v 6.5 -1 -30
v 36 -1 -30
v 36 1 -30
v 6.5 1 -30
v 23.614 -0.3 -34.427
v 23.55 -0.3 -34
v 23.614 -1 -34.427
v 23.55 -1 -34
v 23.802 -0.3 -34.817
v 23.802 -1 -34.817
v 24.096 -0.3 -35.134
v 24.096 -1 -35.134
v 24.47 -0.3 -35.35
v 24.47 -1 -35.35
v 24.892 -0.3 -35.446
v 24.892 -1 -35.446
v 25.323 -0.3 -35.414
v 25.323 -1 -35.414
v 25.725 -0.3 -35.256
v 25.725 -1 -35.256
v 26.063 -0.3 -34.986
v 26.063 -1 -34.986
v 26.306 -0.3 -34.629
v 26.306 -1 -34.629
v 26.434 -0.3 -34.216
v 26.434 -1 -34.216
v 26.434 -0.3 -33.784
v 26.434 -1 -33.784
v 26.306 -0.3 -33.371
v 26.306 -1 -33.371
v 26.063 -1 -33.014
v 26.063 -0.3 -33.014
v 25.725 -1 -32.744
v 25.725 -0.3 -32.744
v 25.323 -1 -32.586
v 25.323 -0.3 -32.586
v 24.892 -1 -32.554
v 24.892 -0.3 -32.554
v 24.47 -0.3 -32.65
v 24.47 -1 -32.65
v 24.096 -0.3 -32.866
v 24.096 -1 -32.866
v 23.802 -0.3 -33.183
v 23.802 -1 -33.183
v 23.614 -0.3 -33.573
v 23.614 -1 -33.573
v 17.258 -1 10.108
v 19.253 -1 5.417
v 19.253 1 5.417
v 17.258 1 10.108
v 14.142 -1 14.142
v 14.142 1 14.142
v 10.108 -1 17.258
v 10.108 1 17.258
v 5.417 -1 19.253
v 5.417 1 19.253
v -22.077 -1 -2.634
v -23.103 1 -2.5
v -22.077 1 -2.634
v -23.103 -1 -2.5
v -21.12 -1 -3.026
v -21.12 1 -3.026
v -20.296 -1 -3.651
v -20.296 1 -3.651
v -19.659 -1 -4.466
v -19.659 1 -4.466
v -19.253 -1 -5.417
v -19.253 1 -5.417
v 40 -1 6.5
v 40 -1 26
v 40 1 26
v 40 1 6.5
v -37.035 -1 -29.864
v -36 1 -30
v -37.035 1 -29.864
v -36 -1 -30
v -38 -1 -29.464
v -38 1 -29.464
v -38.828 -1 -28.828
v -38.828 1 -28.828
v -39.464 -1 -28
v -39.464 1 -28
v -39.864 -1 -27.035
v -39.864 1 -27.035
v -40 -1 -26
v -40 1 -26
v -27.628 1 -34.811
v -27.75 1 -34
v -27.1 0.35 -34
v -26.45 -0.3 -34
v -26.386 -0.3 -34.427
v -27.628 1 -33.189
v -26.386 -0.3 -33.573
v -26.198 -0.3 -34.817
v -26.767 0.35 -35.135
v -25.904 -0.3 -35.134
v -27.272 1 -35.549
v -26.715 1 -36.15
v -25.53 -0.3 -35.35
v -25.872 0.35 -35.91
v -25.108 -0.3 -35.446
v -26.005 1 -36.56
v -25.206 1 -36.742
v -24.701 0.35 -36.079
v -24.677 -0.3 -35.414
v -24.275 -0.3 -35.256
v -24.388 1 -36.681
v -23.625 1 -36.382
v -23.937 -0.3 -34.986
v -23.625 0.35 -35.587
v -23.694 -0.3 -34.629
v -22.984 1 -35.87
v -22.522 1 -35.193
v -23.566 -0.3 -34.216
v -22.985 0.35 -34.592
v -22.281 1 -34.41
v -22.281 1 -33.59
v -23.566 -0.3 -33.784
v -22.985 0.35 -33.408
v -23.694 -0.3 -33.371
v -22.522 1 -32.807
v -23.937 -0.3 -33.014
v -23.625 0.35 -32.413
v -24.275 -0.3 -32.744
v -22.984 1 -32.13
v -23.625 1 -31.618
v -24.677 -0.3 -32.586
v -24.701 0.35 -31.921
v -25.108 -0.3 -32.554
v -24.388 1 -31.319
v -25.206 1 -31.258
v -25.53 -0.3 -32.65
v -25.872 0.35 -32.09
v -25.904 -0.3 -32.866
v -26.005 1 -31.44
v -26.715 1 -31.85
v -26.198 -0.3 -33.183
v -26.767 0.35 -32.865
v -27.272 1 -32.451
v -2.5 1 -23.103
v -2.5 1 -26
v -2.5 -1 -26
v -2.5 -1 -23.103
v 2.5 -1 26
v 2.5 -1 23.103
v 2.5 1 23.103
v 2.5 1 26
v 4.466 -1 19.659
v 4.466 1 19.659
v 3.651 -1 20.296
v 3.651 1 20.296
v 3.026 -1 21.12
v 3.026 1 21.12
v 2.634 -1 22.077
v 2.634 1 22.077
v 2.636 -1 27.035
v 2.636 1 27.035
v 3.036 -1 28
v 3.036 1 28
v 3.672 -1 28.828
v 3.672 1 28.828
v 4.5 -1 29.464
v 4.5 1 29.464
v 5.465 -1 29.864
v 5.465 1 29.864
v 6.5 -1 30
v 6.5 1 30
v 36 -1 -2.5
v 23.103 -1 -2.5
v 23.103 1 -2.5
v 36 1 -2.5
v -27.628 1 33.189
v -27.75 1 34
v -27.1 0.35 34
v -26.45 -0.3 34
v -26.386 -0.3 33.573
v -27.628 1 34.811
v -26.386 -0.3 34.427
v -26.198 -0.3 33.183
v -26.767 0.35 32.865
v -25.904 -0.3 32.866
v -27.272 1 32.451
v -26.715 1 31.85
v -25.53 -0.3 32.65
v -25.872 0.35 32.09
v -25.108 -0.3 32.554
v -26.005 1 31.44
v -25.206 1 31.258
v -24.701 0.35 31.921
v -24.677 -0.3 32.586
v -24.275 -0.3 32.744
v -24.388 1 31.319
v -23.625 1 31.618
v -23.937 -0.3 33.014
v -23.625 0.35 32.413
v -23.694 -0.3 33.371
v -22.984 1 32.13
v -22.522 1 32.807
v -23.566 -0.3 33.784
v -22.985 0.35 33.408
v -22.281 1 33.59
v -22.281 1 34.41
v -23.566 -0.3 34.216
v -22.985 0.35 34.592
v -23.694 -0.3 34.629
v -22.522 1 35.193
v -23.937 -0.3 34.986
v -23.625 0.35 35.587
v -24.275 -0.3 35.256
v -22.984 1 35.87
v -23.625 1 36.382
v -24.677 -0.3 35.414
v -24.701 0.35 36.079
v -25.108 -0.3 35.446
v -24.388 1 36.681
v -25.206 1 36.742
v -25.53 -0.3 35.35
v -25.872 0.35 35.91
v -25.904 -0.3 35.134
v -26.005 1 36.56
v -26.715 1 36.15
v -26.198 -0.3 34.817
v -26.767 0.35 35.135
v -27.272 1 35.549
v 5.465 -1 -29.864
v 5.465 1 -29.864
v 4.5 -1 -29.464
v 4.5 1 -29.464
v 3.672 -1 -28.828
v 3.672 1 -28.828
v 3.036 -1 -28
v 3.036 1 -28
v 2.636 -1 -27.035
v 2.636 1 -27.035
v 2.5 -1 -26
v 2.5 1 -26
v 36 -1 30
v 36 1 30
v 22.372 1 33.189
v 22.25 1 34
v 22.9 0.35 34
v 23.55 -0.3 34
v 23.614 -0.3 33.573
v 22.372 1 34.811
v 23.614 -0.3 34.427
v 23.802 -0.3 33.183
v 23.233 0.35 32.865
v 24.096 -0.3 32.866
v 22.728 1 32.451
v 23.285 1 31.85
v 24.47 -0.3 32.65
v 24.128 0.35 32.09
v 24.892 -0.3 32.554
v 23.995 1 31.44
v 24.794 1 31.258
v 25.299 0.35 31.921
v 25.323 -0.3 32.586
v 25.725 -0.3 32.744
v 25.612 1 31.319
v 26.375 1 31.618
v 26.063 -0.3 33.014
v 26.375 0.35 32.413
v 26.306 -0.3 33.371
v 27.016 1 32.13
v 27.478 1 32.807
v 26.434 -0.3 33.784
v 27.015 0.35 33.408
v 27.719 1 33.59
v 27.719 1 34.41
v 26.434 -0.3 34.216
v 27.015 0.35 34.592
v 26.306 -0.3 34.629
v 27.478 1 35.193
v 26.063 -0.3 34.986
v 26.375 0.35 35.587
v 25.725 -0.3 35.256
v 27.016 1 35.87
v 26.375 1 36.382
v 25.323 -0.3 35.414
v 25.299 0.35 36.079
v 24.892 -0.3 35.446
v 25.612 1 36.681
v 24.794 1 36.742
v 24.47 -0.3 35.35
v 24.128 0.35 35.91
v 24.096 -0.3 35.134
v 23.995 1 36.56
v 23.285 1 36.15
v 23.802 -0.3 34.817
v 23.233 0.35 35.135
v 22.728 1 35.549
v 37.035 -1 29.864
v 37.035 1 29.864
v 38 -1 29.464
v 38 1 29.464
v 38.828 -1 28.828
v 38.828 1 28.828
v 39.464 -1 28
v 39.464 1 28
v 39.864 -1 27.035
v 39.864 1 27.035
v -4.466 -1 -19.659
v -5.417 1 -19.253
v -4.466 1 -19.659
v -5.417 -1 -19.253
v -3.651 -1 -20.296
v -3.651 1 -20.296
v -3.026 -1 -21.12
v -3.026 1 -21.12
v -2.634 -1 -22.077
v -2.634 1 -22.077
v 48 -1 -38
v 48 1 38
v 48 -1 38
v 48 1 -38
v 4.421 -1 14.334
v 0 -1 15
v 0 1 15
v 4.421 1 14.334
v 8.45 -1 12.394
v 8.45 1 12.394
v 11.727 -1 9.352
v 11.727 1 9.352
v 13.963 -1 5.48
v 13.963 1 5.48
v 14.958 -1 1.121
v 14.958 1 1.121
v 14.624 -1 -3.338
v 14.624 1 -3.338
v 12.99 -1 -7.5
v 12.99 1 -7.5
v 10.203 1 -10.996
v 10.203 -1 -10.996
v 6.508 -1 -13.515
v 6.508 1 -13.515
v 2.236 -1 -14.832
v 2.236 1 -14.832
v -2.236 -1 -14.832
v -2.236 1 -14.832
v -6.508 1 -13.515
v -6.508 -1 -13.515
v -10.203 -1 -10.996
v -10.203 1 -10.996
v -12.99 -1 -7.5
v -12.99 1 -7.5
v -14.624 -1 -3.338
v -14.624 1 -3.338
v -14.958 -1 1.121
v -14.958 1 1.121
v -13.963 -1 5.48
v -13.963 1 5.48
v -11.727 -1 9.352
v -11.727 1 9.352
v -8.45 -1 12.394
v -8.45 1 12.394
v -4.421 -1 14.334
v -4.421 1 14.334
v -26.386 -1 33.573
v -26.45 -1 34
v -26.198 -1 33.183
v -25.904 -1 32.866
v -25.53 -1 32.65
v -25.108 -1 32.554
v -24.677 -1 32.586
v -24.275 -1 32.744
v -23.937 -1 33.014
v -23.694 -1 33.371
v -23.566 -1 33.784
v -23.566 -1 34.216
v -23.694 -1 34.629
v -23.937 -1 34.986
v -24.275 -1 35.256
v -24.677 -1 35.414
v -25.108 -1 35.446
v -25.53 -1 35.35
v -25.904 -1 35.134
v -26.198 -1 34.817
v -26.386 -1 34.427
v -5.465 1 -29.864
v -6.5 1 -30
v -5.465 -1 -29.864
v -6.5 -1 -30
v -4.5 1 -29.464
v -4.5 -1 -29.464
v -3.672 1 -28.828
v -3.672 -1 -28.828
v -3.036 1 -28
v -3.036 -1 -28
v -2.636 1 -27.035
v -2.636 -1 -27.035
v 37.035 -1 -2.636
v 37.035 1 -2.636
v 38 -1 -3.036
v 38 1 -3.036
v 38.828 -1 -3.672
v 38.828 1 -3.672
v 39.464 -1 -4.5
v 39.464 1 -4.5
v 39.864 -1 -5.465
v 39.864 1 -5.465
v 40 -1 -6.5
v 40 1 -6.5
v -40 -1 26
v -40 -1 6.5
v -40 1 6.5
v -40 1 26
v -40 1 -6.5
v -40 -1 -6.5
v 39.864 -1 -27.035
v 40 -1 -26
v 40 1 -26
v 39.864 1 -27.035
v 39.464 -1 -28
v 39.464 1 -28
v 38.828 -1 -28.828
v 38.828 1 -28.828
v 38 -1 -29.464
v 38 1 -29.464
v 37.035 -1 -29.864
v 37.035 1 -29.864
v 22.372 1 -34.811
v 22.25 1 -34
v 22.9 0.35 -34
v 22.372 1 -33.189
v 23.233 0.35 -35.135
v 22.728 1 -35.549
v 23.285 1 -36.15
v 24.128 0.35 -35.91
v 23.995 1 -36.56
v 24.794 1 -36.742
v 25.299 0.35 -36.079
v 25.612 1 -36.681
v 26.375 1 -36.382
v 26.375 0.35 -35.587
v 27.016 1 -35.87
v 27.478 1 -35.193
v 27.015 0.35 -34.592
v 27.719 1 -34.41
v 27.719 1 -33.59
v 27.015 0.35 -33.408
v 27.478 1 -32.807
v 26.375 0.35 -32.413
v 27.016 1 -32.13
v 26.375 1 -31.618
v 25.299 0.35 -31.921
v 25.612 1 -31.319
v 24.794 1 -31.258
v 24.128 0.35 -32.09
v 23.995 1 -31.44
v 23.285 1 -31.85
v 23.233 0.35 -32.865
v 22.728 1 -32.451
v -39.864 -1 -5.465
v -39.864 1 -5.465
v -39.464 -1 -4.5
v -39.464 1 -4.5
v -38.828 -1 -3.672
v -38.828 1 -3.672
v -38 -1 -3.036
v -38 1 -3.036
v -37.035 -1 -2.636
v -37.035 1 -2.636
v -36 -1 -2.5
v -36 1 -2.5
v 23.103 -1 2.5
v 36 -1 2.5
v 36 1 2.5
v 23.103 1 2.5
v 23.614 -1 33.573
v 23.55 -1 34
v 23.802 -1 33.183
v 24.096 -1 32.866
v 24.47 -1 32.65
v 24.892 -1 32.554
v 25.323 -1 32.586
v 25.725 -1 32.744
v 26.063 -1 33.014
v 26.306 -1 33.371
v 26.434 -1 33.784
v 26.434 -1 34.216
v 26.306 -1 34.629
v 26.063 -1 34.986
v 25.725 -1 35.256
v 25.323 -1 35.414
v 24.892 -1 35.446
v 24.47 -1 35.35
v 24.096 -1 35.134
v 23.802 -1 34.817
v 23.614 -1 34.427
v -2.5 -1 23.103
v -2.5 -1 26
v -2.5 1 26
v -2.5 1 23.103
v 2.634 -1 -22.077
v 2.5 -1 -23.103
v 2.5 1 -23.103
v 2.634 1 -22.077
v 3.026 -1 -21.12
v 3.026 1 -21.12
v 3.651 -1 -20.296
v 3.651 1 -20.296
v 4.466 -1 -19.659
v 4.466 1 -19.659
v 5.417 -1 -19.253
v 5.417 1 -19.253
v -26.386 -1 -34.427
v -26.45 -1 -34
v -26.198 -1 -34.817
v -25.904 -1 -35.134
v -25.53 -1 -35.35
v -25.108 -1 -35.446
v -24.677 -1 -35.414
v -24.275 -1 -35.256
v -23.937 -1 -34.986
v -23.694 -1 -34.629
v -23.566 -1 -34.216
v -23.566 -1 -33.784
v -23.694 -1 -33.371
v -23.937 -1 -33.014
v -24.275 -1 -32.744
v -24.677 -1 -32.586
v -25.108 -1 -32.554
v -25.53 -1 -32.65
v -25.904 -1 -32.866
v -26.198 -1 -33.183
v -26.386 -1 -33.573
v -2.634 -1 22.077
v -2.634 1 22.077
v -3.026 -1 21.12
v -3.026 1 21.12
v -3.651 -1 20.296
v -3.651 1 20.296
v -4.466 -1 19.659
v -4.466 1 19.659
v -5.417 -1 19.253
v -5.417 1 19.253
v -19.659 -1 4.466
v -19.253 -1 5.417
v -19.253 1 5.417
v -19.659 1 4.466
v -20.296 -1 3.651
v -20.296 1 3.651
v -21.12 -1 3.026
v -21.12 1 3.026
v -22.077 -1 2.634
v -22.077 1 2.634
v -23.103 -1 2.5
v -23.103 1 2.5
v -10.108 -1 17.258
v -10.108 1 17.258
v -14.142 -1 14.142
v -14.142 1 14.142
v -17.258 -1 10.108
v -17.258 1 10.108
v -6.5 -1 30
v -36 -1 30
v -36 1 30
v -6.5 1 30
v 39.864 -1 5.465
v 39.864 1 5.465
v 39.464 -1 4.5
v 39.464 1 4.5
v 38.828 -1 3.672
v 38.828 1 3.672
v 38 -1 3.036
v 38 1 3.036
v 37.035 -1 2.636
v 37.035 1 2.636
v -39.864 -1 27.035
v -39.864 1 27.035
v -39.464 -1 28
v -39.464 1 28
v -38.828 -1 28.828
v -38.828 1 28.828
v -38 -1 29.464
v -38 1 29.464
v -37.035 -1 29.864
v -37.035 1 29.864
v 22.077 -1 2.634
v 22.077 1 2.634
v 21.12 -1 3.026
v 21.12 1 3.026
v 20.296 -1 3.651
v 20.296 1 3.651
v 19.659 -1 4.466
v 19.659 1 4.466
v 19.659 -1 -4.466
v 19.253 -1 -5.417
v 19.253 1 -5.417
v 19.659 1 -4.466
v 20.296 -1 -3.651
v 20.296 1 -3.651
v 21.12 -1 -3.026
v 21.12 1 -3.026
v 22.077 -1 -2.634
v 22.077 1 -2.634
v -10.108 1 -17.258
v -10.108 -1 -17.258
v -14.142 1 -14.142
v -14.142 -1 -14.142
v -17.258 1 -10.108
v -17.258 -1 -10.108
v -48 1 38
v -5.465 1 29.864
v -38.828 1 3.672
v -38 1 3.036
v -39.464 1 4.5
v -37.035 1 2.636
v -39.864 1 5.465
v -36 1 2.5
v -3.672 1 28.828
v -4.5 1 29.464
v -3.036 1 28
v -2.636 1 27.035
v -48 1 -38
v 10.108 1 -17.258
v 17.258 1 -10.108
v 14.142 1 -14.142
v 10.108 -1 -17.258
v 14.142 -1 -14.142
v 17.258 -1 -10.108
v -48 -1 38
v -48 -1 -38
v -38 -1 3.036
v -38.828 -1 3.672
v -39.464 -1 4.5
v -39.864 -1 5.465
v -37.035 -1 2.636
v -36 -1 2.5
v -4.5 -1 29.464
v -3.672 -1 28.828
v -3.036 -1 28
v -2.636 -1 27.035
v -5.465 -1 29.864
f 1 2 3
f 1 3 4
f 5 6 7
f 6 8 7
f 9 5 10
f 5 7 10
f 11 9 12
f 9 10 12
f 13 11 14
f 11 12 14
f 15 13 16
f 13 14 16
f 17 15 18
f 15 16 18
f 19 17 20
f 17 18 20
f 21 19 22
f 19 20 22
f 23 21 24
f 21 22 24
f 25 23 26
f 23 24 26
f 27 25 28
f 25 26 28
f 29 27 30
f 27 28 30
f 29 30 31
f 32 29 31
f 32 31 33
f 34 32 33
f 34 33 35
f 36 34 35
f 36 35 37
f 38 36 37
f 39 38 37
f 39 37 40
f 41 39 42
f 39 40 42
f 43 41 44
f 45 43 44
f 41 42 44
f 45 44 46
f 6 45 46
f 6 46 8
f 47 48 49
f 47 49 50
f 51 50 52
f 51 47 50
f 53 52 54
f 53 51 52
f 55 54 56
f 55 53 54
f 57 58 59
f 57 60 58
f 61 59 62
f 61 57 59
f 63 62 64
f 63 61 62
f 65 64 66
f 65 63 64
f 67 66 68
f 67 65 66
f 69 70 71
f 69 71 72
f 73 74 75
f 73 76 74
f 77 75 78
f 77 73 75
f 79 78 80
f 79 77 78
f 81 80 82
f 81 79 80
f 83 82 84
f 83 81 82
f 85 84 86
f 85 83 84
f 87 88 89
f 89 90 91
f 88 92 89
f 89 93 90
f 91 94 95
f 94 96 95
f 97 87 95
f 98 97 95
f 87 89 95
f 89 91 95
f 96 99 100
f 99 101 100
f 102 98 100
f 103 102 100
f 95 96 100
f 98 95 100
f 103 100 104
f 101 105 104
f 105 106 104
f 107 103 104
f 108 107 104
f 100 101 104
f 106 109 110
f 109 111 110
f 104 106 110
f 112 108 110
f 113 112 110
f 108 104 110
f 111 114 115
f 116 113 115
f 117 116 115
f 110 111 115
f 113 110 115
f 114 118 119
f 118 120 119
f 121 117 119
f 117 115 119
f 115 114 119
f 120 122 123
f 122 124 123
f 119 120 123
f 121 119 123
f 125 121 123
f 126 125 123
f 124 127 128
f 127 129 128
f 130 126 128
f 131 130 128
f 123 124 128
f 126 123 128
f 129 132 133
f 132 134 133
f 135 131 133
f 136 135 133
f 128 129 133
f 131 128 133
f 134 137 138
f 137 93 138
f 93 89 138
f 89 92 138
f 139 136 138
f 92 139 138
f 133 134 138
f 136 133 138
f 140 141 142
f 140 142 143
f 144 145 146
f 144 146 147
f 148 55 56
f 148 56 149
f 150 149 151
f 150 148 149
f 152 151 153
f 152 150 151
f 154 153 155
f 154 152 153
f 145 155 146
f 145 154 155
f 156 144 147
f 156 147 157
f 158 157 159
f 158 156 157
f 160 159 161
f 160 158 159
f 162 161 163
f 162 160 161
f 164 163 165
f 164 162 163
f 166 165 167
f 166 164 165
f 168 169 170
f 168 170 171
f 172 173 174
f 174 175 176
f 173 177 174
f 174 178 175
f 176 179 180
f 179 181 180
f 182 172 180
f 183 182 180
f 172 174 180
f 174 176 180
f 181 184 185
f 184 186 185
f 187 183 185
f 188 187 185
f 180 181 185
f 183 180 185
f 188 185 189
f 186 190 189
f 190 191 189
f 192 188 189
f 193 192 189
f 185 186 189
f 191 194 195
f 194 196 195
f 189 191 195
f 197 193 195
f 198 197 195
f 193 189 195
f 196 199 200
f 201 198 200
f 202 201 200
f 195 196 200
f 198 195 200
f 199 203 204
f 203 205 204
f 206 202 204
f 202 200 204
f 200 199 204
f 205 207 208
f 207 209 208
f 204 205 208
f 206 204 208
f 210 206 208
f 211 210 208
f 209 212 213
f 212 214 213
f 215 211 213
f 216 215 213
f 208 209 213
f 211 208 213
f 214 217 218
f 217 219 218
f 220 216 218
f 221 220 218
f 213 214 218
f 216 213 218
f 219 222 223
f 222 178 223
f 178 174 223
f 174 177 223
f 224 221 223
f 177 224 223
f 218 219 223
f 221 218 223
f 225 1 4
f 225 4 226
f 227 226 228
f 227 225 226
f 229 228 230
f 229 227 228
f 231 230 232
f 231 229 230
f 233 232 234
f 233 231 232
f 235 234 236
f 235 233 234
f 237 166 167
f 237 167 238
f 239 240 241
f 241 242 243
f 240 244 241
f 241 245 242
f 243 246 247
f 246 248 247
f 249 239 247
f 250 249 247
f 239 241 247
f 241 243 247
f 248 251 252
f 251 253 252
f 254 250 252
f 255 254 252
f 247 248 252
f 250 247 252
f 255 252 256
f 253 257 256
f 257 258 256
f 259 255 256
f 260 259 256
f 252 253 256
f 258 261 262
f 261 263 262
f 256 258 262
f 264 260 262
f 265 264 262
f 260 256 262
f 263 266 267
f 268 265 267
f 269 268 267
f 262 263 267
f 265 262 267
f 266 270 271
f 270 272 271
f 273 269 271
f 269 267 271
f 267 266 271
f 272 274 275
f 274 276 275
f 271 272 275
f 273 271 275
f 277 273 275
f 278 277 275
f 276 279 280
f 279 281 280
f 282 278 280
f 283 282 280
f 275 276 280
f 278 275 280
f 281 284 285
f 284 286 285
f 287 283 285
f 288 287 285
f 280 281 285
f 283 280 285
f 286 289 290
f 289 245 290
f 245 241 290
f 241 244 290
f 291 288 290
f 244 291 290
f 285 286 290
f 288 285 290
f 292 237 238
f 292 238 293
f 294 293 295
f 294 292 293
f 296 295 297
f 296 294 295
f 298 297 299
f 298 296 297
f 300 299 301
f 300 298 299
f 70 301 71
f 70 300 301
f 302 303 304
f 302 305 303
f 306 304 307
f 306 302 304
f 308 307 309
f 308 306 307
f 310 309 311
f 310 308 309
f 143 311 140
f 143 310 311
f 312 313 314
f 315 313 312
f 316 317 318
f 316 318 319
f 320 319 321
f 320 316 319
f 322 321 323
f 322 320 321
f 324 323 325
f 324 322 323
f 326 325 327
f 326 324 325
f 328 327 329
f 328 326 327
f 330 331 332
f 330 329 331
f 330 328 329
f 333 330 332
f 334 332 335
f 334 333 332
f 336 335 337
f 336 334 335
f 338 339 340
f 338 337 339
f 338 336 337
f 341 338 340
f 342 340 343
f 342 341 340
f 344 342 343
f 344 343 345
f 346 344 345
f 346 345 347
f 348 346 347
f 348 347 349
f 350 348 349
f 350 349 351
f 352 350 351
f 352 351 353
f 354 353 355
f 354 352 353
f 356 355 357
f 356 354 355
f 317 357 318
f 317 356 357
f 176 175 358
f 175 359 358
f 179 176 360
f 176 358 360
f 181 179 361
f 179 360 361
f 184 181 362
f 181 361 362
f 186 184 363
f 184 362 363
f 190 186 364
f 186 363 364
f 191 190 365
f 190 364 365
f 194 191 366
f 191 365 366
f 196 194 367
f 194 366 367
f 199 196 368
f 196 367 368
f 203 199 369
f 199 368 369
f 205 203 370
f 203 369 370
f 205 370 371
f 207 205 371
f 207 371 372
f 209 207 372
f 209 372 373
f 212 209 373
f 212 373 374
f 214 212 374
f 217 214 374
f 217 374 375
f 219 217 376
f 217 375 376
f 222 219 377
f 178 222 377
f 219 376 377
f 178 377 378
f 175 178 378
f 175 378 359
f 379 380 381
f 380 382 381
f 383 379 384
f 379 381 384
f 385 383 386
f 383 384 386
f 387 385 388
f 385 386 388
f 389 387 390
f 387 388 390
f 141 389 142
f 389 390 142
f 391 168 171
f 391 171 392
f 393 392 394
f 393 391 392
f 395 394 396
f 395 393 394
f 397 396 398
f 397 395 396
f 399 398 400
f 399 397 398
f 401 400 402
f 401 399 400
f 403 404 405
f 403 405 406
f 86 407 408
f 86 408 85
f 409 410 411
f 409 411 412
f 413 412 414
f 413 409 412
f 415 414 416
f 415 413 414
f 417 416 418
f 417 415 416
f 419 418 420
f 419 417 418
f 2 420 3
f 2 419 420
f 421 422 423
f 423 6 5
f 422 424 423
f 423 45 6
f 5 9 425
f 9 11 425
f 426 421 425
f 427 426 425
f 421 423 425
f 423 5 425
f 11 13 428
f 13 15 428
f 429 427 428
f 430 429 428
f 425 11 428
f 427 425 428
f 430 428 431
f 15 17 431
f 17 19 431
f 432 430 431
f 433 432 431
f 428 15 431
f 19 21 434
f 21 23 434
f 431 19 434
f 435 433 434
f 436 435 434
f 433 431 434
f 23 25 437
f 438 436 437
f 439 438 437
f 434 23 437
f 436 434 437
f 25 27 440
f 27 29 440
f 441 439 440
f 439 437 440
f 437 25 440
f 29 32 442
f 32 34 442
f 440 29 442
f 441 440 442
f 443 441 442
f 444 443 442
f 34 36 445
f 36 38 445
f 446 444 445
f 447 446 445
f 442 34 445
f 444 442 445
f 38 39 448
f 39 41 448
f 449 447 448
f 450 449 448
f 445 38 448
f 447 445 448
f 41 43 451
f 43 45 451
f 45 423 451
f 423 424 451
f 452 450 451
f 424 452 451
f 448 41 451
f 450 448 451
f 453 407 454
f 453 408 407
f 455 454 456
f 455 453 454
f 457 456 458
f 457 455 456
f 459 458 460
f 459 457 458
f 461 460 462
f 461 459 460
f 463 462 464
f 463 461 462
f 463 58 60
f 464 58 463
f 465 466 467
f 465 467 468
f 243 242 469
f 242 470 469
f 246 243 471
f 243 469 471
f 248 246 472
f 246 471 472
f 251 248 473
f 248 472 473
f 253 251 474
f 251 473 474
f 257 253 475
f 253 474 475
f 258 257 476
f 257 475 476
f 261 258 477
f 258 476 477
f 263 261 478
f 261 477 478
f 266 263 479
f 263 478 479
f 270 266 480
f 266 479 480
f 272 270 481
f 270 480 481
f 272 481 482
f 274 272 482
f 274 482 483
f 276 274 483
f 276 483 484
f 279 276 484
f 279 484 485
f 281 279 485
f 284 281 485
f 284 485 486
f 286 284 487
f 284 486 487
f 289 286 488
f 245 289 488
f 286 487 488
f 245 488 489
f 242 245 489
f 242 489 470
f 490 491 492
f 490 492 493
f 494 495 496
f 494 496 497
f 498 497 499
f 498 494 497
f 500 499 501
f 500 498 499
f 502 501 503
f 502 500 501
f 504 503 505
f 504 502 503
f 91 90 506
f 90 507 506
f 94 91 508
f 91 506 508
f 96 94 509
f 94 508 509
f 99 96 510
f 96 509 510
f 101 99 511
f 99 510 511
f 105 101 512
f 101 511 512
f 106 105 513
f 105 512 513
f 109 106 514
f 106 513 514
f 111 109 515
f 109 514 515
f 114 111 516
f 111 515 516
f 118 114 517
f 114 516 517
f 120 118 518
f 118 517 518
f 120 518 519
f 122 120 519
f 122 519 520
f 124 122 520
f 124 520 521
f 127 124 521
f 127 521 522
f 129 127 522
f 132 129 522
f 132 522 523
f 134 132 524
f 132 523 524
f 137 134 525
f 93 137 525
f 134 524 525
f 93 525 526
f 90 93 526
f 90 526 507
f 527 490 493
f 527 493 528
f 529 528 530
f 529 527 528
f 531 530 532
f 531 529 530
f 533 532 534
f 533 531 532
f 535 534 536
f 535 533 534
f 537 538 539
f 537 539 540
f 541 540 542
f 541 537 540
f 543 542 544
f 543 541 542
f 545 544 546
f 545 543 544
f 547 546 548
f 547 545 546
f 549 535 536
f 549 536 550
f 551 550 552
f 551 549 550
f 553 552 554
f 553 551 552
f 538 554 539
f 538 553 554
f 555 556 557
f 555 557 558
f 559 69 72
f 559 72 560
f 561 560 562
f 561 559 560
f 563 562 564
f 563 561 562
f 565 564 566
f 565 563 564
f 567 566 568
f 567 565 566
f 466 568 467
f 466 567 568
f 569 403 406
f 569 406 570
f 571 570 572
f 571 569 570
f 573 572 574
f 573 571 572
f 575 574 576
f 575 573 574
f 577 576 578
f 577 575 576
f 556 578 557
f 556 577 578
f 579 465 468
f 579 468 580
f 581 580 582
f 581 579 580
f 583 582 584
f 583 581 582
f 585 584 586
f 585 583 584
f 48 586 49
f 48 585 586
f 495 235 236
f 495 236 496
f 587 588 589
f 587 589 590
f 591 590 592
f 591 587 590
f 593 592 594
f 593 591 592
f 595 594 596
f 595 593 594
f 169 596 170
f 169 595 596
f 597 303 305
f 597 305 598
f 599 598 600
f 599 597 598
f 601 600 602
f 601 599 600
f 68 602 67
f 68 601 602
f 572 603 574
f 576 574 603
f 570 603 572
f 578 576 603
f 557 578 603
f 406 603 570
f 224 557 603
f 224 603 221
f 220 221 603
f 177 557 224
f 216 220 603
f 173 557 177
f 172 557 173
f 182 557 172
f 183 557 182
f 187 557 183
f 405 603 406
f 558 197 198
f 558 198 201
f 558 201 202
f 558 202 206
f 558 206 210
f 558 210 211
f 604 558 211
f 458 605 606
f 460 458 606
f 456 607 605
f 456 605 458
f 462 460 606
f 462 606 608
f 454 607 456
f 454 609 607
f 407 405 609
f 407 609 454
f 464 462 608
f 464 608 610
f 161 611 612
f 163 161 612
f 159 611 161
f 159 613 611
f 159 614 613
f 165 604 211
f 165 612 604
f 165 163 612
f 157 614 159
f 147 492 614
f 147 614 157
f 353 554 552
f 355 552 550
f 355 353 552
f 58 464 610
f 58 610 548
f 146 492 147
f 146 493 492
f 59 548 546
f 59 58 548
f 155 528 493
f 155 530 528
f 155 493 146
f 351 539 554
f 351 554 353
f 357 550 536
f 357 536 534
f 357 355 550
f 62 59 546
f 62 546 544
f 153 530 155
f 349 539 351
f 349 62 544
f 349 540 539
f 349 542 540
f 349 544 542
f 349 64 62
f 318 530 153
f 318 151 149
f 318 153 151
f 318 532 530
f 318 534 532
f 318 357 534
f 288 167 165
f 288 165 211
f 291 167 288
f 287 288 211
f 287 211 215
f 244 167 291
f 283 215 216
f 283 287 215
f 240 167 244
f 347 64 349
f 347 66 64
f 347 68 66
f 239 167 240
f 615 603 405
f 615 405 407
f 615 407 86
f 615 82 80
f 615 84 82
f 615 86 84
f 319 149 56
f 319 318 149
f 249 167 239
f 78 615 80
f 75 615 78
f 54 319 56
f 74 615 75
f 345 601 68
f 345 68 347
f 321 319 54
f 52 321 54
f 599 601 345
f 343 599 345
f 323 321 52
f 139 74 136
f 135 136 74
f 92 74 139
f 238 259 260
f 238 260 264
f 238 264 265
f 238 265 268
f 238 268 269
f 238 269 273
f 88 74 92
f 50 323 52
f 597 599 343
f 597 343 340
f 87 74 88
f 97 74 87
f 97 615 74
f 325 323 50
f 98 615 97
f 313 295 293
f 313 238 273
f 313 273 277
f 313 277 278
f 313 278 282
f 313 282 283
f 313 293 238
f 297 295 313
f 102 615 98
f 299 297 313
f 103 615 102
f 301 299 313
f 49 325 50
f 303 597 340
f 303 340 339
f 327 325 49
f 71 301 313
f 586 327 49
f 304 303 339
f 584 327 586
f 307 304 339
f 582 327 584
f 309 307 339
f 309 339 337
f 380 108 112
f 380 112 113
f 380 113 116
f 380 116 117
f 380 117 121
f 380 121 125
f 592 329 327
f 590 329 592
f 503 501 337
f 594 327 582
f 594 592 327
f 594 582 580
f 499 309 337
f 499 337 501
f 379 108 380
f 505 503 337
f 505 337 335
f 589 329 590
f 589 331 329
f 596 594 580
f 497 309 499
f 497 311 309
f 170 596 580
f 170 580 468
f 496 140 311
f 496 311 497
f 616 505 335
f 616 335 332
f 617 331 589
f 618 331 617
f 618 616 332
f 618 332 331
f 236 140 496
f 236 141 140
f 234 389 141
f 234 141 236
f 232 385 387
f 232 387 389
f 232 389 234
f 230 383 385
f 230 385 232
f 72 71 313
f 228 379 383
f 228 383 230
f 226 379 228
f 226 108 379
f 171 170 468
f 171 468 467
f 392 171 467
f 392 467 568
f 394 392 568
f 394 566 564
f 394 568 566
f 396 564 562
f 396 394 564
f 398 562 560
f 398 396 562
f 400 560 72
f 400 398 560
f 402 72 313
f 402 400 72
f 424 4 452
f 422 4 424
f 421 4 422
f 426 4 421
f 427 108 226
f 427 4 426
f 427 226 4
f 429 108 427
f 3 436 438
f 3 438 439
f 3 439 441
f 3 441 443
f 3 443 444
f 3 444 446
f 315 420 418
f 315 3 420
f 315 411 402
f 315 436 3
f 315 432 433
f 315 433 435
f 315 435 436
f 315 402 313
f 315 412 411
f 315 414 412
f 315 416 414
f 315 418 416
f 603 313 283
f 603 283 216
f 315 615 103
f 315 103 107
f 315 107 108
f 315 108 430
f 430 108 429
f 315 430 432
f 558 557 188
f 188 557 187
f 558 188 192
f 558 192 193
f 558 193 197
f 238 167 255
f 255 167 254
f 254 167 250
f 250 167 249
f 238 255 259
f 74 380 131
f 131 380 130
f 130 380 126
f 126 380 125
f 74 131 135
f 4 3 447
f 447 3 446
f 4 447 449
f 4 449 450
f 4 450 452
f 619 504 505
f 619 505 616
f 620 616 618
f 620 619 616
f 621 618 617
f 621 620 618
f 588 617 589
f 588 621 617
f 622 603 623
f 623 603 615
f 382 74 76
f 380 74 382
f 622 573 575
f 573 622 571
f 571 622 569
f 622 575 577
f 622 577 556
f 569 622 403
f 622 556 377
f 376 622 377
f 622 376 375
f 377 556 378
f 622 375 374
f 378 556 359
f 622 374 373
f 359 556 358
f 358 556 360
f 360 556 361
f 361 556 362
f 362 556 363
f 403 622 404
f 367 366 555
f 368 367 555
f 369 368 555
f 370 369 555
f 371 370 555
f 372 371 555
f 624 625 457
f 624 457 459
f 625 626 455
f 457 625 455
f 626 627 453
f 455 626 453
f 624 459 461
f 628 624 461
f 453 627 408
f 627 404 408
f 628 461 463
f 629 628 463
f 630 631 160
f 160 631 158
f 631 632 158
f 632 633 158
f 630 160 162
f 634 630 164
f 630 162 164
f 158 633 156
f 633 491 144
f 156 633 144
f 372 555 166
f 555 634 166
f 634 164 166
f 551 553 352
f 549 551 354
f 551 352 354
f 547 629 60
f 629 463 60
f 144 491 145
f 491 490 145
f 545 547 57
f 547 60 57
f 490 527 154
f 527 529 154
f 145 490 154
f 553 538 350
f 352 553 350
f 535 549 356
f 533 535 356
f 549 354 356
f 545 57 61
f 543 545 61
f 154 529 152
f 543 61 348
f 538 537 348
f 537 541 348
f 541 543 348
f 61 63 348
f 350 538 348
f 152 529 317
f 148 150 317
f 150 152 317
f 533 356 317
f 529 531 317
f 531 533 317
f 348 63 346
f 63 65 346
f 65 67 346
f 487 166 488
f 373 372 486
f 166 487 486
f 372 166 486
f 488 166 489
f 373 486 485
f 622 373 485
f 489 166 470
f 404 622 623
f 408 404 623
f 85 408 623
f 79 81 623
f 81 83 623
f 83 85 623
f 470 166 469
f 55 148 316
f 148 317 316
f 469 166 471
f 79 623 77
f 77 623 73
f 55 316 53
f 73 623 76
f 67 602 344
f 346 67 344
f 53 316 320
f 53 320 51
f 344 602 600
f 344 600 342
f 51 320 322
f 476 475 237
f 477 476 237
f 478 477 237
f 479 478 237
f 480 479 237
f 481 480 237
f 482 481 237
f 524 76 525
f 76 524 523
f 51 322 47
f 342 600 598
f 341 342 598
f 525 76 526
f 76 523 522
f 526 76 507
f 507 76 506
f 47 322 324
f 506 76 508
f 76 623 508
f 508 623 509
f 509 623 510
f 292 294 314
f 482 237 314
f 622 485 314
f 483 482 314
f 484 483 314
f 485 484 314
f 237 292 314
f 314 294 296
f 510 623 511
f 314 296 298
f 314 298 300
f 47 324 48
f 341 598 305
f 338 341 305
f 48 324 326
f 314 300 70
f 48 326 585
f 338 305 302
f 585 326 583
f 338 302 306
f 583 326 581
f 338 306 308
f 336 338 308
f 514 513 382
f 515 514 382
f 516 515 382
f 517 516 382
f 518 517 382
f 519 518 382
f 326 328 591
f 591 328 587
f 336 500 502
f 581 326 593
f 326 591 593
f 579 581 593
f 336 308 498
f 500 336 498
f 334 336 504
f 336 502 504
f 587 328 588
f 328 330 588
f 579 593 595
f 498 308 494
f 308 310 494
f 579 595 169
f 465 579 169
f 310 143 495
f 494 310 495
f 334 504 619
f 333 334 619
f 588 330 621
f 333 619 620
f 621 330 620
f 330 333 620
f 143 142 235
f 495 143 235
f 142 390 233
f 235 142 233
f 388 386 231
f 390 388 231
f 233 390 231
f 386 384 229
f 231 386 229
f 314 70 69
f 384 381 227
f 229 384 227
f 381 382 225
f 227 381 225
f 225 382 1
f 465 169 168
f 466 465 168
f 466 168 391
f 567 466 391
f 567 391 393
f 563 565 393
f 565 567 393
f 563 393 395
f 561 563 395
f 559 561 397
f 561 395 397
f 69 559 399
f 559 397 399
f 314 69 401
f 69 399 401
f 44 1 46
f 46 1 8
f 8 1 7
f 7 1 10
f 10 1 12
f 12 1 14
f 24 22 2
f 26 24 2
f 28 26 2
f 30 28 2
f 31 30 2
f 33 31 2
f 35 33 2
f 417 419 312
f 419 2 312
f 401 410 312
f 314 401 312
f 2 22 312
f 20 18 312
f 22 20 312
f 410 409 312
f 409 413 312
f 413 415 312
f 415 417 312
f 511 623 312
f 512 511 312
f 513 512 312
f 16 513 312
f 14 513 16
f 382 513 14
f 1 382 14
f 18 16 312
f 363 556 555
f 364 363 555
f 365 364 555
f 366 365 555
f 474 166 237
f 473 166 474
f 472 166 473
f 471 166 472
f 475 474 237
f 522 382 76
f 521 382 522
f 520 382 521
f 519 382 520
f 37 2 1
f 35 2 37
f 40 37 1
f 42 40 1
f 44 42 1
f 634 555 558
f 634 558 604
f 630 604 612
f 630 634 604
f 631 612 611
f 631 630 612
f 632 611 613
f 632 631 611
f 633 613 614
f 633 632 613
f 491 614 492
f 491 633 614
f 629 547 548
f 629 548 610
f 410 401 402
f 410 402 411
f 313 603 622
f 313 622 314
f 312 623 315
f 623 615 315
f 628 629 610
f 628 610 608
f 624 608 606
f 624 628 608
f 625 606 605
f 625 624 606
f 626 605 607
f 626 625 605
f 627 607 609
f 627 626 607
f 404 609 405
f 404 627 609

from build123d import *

# Parameters (mm, degrees)
SCHIZZO1_W                               = 96
SCHIZZO1_H                               = 76
ESTRUSIONE_ESTRUSIONE1_DEPTH             = 1
TAGLIO_ESTRUSIONE1_DEPTH                 = 62.253571324
TAGLIO_ESTRUSIONE1_DEPTH_BACK            = 62.253571324
SCHIZZO2_R                               = 15
TAGLIO_ESTRUSIONE2_DEPTH                 = 62.253571324
RACCORDO1_R                              = 4
SPECCHIA1_START                          = -1
SPECCHIA1_DEPTH                          = 2
FORO_SVASATO_PER_VITE_M2_5_1_D           = 2.9
FORO_SVASATO_PER_VITE_M2_5_1_DEPTH       = 8.25
FORO_SVASATO_PER_VITE_M2_5_1_CSINK_D     = 5.5
FORO_SVASATO_PER_VITE_M2_5_1_CSINK_ANGLE = 90
FORO_SVASATO_PER_VITE_M2_5_1_TIP         = 0.871247898


# Read off the part's stored shape, not the designer's step: Specchia1
with BuildPart() as part:
    # Schizzo1 → Estrusione-Estrusione1 (new, symmetric)
    with BuildSketch(Plane(origin=(0, 0, 0), x_dir=(1, 0, 0), z_dir=(0, 1, 0))):
        Rectangle(SCHIZZO1_W, SCHIZZO1_H)
    extrude(amount=ESTRUSIONE_ESTRUSIONE1_DEPTH, both=True)

    # Schizzo2 → Taglio-Estrusione1 (cut, two sides: drawn at the far end of the back side and taken through both)
    with BuildSketch(Plane(origin=(0, 1, 0), x_dir=(1, 0, 0), z_dir=(0, 1, 0)).offset(-TAGLIO_ESTRUSIONE1_DEPTH_BACK)):
        with Locations(Location((0, 0, 0), (0, 0, 270))):
            Circle(SCHIZZO2_R)
    extrude(amount=TAGLIO_ESTRUSIONE1_DEPTH + TAGLIO_ESTRUSIONE1_DEPTH_BACK, mode=Mode.SUBTRACT)

    # Schizzo3 → Taglio-Estrusione2 (cut, through all)
    with BuildSketch(Plane(origin=(0, 1, 0), x_dir=(1, 0, 0), z_dir=(0, 1, 0))):
        with BuildLine():
            Line((-2.5, 30), (-2.5, 19.843134833))
            ThreePointArc((-2.5, 19.843134833), (-14.142135624, 14.142135624), (-19.843134833, 2.5))
            Line((-19.843134833, 2.5), (-40, 2.5))
            Line((-40, 2.5), (-40, 30))
            Line((-40, 30), (-2.5, 30))
        make_face()
    extrude(amount=-TAGLIO_ESTRUSIONE2_DEPTH, mode=Mode.SUBTRACT)

    # Raccordo1
    raccordo1_edges = [part.edges().sort_by_distance(p)[0] for p in [
        (-40, 0, -2.5),
        (-40, 0, -30),
        (-2.5, 0, -30),
        (-2.5, 0, -19.843134833),
        (-19.843134833, 0, -2.5),
    ]]
    fillet(raccordo1_edges, radius=RACCORDO1_R)

    # Specchia1 outline → Specchia1 (cut)
    with BuildSketch(Plane(origin=(0, 0, 0), x_dir=(1, 0, 0), z_dir=(0, 1, 0)).offset(SPECCHIA1_START)):
        with BuildLine():
            Line((-40, -6.5), (-40, -26))
            ThreePointArc((-40, -26), (-38.828427125, -28.828427125), (-36, -30))
            Line((-36, -30), (-6.5, -30))
            ThreePointArc((-6.5, -30), (-3.671572875, -28.828427125), (-2.5, -26))
            Line((-2.5, -26), (-2.5, -23.103030104))
            ThreePointArc((-2.5, -23.103030104), (-3.311478922, -20.687800647), (-5.416666667, -19.252525087))
            ThreePointArc((-5.416666667, -19.252525087), (-14.142135624, -14.142135624), (-19.252525087, -5.416666667))
            ThreePointArc((-19.252525087, -5.416666667), (-20.687800647, -3.311478922), (-23.103030104, -2.5))
            Line((-23.103030104, -2.5), (-36, -2.5))
            ThreePointArc((-36, -2.5), (-38.828427125, -3.671572875), (-40, -6.5))
        make_face()
        with BuildLine():
            Line((36, 30), (6.5, 30))
            ThreePointArc((6.5, 30), (3.671572875, 28.828427125), (2.5, 26))
            Line((2.5, 26), (2.5, 23.103030104))
            ThreePointArc((2.5, 23.103030104), (3.311478922, 20.687800647), (5.416666667, 19.252525087))
            ThreePointArc((5.416666667, 19.252525087), (14.142135624, 14.142135624), (19.252525087, 5.416666667))
            ThreePointArc((19.252525087, 5.416666667), (20.687800647, 3.311478922), (23.103030104, 2.5))
            Line((23.103030104, 2.5), (36, 2.5))
            ThreePointArc((36, 2.5), (38.828427125, 3.671572875), (40, 6.5))
            Line((40, 6.5), (40, 26))
            ThreePointArc((40, 26), (38.828427125, 28.828427125), (36, 30))
        make_face()
        with BuildLine():
            ThreePointArc((19.252525087, -5.416666667), (14.142135624, -14.142135624), (5.416666667, -19.252525087))
            ThreePointArc((5.416666667, -19.252525087), (3.311478922, -20.687800647), (2.5, -23.103030104))
            Line((2.5, -23.103030104), (2.5, -26))
            ThreePointArc((2.5, -26), (3.671572875, -28.828427125), (6.5, -30))
            Line((6.5, -30), (36, -30))
            ThreePointArc((36, -30), (38.828427125, -28.828427125), (40, -26))
            Line((40, -26), (40, -6.5))
            ThreePointArc((40, -6.5), (38.828427125, -3.671572875), (36, -2.5))
            Line((36, -2.5), (23.103030104, -2.5))
            ThreePointArc((23.103030104, -2.5), (20.687800647, -3.311478922), (19.252525087, -5.416666667))
        make_face()
    extrude(amount=SPECCHIA1_DEPTH, mode=Mode.SUBTRACT)

    # Foro svasato per Vite M2.5-1
    with Locations(Plane(origin=(0, 1, 0), x_dir=(1, 0, 0), z_dir=(0, 1, 0))):
        with Locations((-25, 34), (25, 34), (25, -34), (-25, -34)):
            CounterSinkHole(FORO_SVASATO_PER_VITE_M2_5_1_D / 2, FORO_SVASATO_PER_VITE_M2_5_1_CSINK_D / 2, depth=FORO_SVASATO_PER_VITE_M2_5_1_DEPTH, counter_sink_angle=FORO_SVASATO_PER_VITE_M2_5_1_CSINK_ANGLE)
            with Locations((0, 0, -(FORO_SVASATO_PER_VITE_M2_5_1_DEPTH + FORO_SVASATO_PER_VITE_M2_5_1_TIP / 2))):  # 118° drill point
                Cone(0, FORO_SVASATO_PER_VITE_M2_5_1_D / 2, FORO_SVASATO_PER_VITE_M2_5_1_TIP, mode=Mode.SUBTRACT)


solid = part.part
